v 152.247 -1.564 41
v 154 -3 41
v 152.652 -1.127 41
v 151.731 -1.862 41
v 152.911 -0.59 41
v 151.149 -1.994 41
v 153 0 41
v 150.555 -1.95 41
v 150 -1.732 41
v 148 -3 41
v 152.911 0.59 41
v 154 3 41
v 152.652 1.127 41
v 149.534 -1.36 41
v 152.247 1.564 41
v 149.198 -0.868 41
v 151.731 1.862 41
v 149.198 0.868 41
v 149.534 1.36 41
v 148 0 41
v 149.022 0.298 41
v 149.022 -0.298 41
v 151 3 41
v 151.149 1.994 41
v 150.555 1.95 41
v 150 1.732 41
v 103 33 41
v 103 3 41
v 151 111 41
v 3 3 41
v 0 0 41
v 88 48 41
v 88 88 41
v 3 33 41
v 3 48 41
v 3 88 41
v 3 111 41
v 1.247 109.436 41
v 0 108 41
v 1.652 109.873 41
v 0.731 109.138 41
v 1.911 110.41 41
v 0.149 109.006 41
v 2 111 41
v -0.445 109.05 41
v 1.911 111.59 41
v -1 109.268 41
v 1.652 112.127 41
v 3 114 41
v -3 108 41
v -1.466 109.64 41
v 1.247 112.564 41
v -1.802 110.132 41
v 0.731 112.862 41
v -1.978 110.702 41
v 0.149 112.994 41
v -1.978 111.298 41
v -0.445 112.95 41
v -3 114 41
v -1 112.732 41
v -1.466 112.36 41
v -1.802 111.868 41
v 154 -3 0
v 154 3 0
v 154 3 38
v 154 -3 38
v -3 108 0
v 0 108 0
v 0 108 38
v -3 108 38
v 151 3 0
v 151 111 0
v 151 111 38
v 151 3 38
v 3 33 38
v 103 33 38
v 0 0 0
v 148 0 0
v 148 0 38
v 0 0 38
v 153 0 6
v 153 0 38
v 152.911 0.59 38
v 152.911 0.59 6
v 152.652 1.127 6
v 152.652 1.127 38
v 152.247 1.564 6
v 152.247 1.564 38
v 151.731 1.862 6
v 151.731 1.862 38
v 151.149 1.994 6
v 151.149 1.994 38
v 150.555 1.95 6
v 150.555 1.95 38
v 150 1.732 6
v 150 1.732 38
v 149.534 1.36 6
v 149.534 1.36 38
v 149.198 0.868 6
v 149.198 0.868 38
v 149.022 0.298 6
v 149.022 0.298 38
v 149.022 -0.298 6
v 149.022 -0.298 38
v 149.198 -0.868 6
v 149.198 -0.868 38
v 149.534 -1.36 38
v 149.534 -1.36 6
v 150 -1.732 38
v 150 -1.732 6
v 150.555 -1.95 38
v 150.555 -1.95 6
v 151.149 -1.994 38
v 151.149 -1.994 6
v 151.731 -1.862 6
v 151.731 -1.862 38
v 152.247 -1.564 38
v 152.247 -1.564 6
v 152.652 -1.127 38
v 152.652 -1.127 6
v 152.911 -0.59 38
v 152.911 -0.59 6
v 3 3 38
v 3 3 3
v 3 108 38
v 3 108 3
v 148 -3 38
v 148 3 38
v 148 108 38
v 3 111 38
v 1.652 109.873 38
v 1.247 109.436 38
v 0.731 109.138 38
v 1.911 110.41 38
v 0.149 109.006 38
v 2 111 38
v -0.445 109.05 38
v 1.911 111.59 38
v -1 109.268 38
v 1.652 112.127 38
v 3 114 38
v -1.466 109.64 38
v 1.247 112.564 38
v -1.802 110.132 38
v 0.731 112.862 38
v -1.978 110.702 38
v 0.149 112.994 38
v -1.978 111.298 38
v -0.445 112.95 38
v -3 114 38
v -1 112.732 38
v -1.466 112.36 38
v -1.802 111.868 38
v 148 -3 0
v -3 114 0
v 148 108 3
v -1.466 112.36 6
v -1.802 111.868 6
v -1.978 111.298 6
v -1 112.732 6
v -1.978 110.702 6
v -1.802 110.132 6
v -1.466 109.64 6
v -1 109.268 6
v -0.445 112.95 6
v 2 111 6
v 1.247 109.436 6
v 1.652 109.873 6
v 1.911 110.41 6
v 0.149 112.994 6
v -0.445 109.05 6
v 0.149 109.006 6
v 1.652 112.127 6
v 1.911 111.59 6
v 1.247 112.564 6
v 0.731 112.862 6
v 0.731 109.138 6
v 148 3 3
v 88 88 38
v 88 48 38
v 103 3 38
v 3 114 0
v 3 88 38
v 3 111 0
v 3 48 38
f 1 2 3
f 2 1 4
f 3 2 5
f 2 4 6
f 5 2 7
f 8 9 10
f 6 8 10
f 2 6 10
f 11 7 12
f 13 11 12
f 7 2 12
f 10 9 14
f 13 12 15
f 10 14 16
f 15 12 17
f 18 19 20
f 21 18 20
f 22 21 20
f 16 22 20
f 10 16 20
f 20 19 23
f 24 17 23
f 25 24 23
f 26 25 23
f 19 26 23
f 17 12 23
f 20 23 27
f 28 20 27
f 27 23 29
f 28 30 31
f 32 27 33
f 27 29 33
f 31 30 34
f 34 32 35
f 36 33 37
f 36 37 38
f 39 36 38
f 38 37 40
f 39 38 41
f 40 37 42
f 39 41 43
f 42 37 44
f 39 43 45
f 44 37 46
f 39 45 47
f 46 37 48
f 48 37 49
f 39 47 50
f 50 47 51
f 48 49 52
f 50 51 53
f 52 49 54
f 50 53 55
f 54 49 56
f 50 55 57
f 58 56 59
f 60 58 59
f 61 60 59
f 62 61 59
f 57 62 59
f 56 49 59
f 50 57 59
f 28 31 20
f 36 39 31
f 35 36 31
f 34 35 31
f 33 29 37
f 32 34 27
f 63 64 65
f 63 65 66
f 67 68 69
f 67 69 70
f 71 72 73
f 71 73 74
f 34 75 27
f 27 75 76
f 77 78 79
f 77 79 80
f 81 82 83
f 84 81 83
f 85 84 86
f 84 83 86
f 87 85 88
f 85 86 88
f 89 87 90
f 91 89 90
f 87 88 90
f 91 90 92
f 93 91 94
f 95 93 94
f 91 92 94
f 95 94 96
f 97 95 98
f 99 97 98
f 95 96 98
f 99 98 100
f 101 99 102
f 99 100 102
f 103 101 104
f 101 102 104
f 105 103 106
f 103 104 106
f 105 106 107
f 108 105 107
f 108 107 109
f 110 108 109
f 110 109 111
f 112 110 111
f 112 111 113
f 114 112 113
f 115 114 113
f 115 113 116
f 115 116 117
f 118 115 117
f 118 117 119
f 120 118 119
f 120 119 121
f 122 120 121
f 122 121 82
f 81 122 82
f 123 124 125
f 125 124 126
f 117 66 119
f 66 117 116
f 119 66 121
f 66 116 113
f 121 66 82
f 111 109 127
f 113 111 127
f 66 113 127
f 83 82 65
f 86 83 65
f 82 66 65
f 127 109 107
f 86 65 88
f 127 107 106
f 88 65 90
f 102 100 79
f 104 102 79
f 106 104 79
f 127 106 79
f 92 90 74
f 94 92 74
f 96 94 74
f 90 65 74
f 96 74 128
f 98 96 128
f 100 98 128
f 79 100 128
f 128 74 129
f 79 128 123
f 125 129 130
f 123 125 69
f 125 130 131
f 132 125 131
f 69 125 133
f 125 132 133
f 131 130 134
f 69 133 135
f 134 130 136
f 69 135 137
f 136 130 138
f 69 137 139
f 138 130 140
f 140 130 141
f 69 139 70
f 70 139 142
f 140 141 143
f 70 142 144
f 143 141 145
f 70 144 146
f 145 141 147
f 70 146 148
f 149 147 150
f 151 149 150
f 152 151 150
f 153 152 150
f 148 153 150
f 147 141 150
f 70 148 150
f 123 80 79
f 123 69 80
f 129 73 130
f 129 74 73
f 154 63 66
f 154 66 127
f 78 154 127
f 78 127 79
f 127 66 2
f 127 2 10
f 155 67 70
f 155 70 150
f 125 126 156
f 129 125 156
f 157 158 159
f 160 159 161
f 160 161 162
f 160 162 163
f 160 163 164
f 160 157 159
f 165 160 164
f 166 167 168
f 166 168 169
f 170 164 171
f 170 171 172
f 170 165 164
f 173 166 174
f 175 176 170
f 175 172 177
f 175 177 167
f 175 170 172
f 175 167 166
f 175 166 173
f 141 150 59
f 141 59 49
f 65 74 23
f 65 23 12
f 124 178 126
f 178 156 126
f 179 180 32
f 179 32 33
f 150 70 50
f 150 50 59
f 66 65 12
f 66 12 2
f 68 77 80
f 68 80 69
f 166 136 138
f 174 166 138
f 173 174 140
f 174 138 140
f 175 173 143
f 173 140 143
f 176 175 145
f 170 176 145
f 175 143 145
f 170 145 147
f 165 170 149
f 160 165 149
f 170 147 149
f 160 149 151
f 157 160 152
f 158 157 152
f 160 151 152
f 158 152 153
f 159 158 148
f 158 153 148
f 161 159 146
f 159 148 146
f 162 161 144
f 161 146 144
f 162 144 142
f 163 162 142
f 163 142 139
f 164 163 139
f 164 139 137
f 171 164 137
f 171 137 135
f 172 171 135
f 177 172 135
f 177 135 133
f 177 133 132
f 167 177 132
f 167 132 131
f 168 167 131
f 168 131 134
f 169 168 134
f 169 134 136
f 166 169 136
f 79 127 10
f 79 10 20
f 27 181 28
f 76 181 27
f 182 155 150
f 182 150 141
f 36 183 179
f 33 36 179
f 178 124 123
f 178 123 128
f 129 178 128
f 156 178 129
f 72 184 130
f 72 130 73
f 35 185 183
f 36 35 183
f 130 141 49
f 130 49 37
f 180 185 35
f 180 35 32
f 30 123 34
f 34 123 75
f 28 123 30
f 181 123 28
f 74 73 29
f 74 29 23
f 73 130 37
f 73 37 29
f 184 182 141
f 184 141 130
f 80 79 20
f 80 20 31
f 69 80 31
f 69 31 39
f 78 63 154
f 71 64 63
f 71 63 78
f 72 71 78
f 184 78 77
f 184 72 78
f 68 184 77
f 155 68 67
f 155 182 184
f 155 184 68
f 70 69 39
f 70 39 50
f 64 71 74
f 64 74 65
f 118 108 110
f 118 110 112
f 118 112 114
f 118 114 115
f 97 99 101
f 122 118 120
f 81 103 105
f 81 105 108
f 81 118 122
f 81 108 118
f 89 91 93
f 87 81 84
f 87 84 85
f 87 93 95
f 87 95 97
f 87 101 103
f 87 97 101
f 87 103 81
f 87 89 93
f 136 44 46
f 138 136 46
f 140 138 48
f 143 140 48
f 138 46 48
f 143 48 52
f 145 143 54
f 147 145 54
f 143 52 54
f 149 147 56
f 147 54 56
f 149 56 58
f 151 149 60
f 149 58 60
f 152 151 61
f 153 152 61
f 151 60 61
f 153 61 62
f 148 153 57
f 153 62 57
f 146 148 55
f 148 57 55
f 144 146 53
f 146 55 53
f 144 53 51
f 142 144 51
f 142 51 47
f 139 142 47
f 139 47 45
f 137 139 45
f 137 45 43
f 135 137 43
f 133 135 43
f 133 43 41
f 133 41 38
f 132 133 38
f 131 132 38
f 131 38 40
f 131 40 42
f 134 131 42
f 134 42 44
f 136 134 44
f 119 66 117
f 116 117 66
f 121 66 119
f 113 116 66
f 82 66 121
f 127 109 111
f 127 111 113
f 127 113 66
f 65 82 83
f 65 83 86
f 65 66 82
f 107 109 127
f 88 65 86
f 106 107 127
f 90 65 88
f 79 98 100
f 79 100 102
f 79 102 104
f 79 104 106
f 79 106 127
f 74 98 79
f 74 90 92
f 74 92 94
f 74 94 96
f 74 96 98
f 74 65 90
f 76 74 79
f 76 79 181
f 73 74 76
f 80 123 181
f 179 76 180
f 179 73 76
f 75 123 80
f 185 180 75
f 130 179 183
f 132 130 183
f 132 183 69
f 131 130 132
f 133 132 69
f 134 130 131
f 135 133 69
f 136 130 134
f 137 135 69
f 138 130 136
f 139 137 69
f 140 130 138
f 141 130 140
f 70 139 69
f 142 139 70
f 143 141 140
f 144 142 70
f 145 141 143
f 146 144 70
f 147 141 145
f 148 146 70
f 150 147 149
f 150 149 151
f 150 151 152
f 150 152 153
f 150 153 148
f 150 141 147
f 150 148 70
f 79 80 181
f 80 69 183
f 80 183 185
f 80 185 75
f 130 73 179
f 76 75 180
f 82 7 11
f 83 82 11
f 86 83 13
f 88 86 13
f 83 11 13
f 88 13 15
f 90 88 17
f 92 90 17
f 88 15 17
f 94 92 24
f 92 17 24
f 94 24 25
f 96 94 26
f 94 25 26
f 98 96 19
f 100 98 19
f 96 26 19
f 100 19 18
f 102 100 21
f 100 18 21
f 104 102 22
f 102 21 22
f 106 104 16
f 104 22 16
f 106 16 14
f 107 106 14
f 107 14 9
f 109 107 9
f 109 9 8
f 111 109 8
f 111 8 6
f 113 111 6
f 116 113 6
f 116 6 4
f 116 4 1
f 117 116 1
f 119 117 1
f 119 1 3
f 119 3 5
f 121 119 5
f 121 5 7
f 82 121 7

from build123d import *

# Parameters (mm, degrees)
SKETCH003_R      = 2
EXTRUDE003_DEPTH = 35
SKETCH002_W      = 100
SKETCH002_H      = 30
SKETCH002_W_2    = 85
SKETCH002_H_2    = 40
EXTRUDE002_DEPTH = 3
EXTRUDE_DEPTH    = 3
EXTRUDE004_DEPTH = 35
SKETCH001_W      = 145
SKETCH001_H      = 105
EXTRUDE001_DEPTH = 35


with BuildPart() as screwstop:
    # Sketch003 (on Face22 of Extrude002) → Extrude003 (new body)
    with BuildSketch(Plane.XY.offset(41)):
        with Locations((151, 0)):
            Circle(SKETCH003_R)
        with Locations((0, 111)):
            Circle(SKETCH003_R)
    extrude(amount=-EXTRUDE003_DEPTH)


with BuildPart() as topwithscrews:
    # Sketch002 (on Face18 of Extrude001) → Extrude002 (new body)
    with BuildSketch(Plane.XY.offset(38)):
        Polygon((154, 3), (154, -3), (148, -3), (148, 0), (0, 0), (0, 108), (-3, 108), (-3, 114), (3, 114), (3, 111), (151, 111), (151, 3), align=None)
        with Locations((53, 18)):
            Rectangle(SKETCH002_W, SKETCH002_H, mode=Mode.SUBTRACT)
        with Locations((45.5, 68)):
            Rectangle(SKETCH002_W_2, SKETCH002_H_2, mode=Mode.SUBTRACT)
    extrude(amount=EXTRUDE002_DEPTH)

    # Cut: cut ScrewsTop
    add(screwstop.part, mode=Mode.SUBTRACT)


with BuildPart() as base:
    # Sketch → Extrude (new body)
    with BuildSketch(Plane.XY):
        Polygon((154, 3), (154, -3), (148, -3), (148, 0), (0, 0), (0, 108), (-3, 108), (-3, 114), (3, 114), (3, 111), (151, 111), (151, 3), align=None)
    extrude(amount=EXTRUDE_DEPTH)


with BuildPart() as screwswalls:
    # Sketch003 (on Face22 of Extrude002) → Extrude004 (new body)
    with BuildSketch(Plane.XY.offset(41)):
        with Locations((151, 0)):
            Circle(SKETCH003_R)
        with Locations((0, 111)):
            Circle(SKETCH003_R)
    extrude(amount=-EXTRUDE004_DEPTH)


with BuildPart() as basewallsscrews:
    # Sketch001 (on Face14 of Extrude) → Extrude001 (new body)
    with BuildSketch(Plane.XY.offset(3)):
        Polygon((154, 3), (154, -3), (148, -3), (148, 0), (0, 0), (0, 108), (-3, 108), (-3, 114), (3, 114), (3, 111), (151, 111), (151, 3), align=None)
        with Locations((75.5, 55.5)):
            Rectangle(SKETCH001_W, SKETCH001_H, mode=Mode.SUBTRACT)
    extrude(amount=EXTRUDE001_DEPTH)

    # Cut001: cut ScrewsWalls
    add(screwswalls.part, mode=Mode.SUBTRACT)

    # Fusion: union Base
    add(base.part)


solid = Compound([topwithscrews.part, basewallsscrews.part])
